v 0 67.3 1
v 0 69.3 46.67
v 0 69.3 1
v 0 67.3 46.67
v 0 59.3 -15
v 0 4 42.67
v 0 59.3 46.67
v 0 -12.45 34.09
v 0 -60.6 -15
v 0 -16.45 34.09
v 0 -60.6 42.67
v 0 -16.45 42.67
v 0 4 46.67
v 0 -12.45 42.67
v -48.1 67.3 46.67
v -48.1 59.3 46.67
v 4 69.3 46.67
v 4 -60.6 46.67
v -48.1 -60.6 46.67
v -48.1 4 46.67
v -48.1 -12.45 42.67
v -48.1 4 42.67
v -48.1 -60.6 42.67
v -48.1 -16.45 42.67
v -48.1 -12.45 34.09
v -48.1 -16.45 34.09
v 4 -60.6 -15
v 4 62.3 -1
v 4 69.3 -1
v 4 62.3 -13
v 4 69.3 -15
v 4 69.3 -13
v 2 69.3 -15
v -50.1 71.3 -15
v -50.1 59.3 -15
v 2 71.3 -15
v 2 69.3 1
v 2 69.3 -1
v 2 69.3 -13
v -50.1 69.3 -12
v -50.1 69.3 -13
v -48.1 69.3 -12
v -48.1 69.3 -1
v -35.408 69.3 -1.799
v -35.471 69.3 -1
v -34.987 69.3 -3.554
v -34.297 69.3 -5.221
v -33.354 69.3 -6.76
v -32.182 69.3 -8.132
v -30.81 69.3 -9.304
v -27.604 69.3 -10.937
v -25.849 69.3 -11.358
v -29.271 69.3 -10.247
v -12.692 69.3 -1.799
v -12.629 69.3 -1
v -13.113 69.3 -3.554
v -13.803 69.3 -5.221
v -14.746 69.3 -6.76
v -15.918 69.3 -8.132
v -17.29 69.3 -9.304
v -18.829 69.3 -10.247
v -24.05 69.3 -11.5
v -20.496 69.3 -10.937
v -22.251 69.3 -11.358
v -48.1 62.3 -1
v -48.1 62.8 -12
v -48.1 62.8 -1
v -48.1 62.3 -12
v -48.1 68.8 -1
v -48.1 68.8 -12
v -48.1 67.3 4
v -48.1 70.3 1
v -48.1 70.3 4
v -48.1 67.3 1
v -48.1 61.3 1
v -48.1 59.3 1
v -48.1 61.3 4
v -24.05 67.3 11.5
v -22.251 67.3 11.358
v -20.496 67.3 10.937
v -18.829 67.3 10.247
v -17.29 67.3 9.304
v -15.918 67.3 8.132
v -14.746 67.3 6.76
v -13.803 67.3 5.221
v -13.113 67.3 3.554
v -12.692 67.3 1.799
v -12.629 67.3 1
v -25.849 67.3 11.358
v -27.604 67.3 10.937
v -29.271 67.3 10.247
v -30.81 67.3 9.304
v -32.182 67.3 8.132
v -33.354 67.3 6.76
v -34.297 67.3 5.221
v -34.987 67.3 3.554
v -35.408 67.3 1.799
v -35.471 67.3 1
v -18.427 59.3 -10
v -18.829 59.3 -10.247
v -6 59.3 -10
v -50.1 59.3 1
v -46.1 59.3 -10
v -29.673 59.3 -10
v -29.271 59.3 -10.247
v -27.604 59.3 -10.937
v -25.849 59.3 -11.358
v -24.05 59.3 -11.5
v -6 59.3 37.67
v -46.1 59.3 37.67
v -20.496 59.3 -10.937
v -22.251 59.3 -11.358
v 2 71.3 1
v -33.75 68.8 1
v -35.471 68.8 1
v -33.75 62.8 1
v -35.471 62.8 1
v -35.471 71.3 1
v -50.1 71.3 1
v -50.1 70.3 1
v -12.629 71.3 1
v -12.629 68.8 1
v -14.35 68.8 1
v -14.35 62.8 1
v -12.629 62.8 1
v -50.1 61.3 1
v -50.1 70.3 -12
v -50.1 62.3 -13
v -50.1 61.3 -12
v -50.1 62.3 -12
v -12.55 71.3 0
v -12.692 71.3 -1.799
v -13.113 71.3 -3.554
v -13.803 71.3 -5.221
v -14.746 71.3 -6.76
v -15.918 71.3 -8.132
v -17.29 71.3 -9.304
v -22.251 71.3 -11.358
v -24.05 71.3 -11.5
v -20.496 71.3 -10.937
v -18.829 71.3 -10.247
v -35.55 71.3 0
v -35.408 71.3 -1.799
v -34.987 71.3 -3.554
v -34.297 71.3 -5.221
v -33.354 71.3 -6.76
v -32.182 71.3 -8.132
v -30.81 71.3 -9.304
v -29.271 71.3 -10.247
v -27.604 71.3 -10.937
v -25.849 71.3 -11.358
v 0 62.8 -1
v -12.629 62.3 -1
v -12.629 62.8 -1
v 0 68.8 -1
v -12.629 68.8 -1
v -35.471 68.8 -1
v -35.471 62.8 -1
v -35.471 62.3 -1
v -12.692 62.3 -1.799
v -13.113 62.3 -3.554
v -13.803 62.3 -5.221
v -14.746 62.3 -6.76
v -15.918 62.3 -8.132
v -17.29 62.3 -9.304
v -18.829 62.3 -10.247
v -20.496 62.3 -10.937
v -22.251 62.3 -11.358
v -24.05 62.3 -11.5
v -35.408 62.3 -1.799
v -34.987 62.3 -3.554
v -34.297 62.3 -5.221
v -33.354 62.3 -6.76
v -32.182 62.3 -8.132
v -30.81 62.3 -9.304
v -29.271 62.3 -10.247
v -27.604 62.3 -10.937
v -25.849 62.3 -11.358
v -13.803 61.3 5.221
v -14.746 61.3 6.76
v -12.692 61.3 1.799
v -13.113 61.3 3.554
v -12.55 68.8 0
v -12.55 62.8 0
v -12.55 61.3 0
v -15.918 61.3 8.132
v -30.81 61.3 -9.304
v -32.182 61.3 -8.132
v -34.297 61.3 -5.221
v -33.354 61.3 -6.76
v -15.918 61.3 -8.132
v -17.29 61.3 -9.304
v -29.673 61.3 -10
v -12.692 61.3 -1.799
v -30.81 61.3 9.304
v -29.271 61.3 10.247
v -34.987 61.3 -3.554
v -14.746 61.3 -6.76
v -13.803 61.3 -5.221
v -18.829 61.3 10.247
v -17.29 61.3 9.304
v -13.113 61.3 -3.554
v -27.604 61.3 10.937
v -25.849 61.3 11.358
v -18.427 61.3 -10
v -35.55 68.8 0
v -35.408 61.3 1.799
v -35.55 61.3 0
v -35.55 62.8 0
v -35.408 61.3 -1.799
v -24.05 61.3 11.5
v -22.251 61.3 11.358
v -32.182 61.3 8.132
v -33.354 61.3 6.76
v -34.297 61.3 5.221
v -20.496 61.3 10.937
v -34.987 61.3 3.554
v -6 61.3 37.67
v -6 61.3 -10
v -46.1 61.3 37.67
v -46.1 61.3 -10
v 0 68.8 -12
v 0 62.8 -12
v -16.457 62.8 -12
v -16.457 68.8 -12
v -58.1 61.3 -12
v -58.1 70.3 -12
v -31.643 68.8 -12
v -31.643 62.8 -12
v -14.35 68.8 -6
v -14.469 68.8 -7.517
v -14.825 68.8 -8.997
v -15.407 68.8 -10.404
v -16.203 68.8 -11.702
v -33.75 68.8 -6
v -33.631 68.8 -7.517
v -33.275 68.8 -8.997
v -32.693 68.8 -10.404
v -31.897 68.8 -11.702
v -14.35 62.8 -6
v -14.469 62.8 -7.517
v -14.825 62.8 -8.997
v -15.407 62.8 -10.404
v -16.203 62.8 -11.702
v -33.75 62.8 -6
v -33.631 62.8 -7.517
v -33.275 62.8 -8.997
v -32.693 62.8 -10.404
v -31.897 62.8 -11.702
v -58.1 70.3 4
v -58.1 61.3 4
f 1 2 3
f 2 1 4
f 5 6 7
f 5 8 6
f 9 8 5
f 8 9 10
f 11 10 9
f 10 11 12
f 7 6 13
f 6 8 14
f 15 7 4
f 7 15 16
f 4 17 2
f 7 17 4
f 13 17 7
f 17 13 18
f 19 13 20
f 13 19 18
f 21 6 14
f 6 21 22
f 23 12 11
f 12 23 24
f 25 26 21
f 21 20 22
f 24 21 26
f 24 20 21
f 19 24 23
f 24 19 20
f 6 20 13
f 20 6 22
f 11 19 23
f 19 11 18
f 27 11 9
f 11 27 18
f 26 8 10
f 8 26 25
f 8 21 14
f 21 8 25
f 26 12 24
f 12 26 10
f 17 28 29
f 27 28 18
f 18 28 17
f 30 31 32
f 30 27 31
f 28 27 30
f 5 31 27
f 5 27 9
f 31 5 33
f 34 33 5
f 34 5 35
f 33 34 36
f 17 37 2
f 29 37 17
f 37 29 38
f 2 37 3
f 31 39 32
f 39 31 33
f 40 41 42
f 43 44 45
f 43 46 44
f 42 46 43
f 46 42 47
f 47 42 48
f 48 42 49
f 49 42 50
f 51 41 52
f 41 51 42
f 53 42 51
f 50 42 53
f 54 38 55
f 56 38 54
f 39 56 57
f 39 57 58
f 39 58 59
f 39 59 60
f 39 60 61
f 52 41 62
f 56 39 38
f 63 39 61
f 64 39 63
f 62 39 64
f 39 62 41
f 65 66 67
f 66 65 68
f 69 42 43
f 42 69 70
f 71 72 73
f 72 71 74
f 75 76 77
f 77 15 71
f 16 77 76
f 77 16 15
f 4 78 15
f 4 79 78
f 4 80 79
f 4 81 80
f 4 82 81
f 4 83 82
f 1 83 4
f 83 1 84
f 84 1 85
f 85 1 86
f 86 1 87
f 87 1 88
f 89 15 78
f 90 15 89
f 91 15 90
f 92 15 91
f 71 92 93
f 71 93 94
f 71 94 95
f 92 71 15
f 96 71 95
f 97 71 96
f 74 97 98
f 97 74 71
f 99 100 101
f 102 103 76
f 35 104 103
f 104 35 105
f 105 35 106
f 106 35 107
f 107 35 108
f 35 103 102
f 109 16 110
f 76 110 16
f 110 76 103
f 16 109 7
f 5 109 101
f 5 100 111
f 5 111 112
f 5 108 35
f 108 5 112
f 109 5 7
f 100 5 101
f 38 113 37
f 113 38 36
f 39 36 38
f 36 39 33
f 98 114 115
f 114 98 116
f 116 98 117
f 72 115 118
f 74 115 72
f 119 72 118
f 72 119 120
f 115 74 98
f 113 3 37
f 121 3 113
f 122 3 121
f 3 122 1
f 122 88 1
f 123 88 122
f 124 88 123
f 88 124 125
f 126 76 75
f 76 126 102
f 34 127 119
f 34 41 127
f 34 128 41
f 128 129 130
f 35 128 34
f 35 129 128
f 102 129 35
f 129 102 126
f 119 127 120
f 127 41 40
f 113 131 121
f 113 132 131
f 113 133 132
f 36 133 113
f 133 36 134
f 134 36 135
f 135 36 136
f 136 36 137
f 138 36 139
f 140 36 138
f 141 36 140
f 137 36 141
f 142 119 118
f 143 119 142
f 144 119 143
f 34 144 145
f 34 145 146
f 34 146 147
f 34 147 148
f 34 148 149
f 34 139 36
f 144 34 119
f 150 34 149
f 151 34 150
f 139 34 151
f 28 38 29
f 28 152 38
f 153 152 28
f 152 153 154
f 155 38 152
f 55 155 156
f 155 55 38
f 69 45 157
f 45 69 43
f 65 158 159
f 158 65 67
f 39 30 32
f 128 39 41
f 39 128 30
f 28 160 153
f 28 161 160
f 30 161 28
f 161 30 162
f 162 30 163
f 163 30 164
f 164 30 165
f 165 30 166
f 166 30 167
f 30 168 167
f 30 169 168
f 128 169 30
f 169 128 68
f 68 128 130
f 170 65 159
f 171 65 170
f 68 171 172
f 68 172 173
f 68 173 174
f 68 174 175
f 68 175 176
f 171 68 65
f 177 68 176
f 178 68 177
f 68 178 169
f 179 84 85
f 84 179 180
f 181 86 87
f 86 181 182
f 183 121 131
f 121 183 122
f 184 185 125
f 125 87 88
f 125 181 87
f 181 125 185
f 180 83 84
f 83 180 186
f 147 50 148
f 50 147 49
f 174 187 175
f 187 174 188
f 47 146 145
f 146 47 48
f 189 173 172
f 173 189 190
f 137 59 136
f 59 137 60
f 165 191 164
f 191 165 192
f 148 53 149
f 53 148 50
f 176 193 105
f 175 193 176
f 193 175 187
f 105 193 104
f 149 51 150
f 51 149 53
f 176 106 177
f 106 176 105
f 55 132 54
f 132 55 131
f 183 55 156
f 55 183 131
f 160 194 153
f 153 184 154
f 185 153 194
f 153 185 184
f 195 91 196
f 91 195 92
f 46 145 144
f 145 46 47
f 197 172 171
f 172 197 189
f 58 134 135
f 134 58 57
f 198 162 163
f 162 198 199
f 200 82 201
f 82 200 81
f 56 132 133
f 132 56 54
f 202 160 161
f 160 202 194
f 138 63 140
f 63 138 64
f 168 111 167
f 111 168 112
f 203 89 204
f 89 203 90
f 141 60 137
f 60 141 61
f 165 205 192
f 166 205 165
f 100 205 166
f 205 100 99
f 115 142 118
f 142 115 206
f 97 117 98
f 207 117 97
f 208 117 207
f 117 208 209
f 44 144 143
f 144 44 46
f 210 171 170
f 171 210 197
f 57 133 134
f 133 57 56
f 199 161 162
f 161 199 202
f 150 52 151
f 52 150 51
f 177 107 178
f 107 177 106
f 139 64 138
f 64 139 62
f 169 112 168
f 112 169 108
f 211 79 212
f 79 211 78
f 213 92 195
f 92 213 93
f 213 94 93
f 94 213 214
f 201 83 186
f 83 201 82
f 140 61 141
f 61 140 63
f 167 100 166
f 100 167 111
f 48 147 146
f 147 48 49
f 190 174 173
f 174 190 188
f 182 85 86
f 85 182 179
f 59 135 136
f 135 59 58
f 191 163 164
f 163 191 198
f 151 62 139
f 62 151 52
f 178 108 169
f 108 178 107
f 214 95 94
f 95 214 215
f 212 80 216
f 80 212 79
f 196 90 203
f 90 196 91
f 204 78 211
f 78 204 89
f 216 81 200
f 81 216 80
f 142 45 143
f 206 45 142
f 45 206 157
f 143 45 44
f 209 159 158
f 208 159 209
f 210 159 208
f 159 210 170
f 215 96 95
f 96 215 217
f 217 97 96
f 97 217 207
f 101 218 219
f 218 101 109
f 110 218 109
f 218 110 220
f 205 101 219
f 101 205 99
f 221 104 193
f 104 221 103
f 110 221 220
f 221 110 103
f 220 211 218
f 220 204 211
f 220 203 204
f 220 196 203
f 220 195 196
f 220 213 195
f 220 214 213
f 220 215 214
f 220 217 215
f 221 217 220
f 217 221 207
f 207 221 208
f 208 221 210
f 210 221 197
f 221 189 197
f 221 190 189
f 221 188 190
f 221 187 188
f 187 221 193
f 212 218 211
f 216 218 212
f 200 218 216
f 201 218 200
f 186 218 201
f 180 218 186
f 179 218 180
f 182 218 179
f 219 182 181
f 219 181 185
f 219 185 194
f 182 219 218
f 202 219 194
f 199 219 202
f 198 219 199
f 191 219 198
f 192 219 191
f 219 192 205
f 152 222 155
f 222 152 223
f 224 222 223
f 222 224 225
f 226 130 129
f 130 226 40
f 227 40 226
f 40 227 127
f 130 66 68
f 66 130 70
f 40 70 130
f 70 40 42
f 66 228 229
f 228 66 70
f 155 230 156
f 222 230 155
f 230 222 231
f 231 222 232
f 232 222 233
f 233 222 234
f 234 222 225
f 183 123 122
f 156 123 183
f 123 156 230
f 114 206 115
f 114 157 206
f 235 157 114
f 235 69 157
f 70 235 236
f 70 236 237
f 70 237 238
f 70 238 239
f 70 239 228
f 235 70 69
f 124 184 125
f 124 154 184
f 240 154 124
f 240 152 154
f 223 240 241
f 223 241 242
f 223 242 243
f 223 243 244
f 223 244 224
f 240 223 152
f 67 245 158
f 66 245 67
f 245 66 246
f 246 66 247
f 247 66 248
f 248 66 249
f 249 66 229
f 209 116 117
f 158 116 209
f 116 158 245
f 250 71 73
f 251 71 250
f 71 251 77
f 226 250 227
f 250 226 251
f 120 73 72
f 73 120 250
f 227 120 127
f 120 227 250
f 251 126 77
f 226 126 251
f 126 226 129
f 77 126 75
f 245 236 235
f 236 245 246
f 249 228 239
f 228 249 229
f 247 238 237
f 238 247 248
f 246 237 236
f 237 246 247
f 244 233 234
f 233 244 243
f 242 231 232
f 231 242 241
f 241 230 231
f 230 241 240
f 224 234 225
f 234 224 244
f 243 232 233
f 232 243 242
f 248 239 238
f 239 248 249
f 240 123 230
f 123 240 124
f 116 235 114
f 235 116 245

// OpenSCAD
// ==============================================================================
// c_bracket.scad
// Parametric OpenSCAD Source for Vehicle-Accurate Right-Hand Corner C-Bracket
// Kia EV6 / E-GMP 95190-CV780 Outlet Box & V2L Connector Lock
// ==============================================================================

$fn = 40;

// Housing & Seated Plug Calibrated Dimensions (mm)
BOX_W = 111.75;         // Long width across car (extends to the left)
BOX_D = 48.15;          // Front-to-back depth (120V face to rear connector face)
BOX_H = 42.67;          // Vertical height (bottom to top lid)
LID_OH = 12.45;         // Rear lid lip overhang
LID_T = 4.58;           // Lid lip vertical thickness

CONN_W = 36.10;         // Orange plug width
CONN_L = 54.60;         // Rigid body length to shoulder
SEATED_GAP = 4.70;      // Front rim to housing gap
PLUG_SHOULDER_Y = SEATED_GAP + CONN_L; // 59.30 mm

CABLE_R = 8.50;         // Cable boot radius (~17mm diameter)
WALL_T = 4.00;          // Structural wall thickness
BRACKET_W = CONN_W + 12.0; // 48.10 mm (Right-hand corner span)

module vehicle_c_spine() {
    difference() {
        union() {
            // 1. Top Plate (Rests on lid above right-hand corner)
            translate([-BRACKET_W, -(BOX_D + LID_OH), BOX_H])
                cube([BRACKET_W, BOX_D + LID_OH + WALL_T, WALL_T]);
            
            // 2. Positive Hook (Catches 12.45mm rear lid overhang)
            translate([-BRACKET_W, -LID_OH - WALL_T, BOX_H - (LID_T + 4.0)])
                cube([BRACKET_W, WALL_T, LID_T + 4.0]);
            
            // 3. Right Outer Flank (Wraps exterior right end of the box)
            translate([0, -(BOX_D + LID_OH), -15.0])
                cube([WALL_T, BOX_D + LID_OH + PLUG_SHOULDER_Y + 10.0, BOX_H + WALL_T + 15.0]);
            
            // 4. Rear Drop Arm at Plug Shoulder
            translate([-BRACKET_W, PLUG_SHOULDER_Y, -15.0])
                cube([BRACKET_W, WALL_T + 4.0, BOX_H + WALL_T + 15.0]);
            
            // 5. Track Housing at Bottom
            translate([-BRACKET_W - 2.0, PLUG_SHOULDER_Y, -15.0])
                cube([BRACKET_W + 4.0, 12.0, 16.0]);
        }
        
        // Slide track slot for Keeper (open on left side)
        translate([-BRACKET_W - 10.0, PLUG_SHOULDER_Y + 3.0, -13.0])
            cube([BRACKET_W + 15.0, 7.0, 12.0]);
        
        // Cable exit cutout
        translate([-BRACKET_W/2, PLUG_SHOULDER_Y + 10.0, 0])
            rotate([90, 0, 0])
                cylinder(r = CABLE_R + 3.0, h = 40.0, center = true);
        
        // Connector clearance pocket
        translate([-BRACKET_W + 2.0, 0, -10.0])
            cube([CONN_W + 4.0, PLUG_SHOULDER_Y + 2.0, BOX_H + 5.0]);
    }
}

module slide_keeper() {
    difference() {
        union() {
            // Main Keeper Bar
            translate([-BRACKET_W, PLUG_SHOULDER_Y + 3.5, -12.0])
                cube([BRACKET_W, 6.0, 13.0]);
            
            // Ergonomic Thumb Pull Tab (on left accessible side)
            translate([-BRACKET_W - 10.0, PLUG_SHOULDER_Y + 2.0, -12.0])
                cube([10.0, 9.0, 16.0]);
        }
        
        // Cable Cradle Slot (U-cutout)
        translate([-BRACKET_W/2, PLUG_SHOULDER_Y + 6.0, -6.0])
            rotate([90, 0, 0])
                cylinder(r = CABLE_R + 1.2, h = 25.0, center = true);
        translate([-BRACKET_W/2 - (CABLE_R + 1.2), PLUG_SHOULDER_Y - 5.0, -6.0])
            cube([2 * (CABLE_R + 1.2), 25.0, 18.0]);
    }
}

// Render Assembled State
color([0.05, 0.52, 0.78, 0.95]) vehicle_c_spine();
color([0.13, 0.77, 0.37, 0.95]) slide_keeper();
